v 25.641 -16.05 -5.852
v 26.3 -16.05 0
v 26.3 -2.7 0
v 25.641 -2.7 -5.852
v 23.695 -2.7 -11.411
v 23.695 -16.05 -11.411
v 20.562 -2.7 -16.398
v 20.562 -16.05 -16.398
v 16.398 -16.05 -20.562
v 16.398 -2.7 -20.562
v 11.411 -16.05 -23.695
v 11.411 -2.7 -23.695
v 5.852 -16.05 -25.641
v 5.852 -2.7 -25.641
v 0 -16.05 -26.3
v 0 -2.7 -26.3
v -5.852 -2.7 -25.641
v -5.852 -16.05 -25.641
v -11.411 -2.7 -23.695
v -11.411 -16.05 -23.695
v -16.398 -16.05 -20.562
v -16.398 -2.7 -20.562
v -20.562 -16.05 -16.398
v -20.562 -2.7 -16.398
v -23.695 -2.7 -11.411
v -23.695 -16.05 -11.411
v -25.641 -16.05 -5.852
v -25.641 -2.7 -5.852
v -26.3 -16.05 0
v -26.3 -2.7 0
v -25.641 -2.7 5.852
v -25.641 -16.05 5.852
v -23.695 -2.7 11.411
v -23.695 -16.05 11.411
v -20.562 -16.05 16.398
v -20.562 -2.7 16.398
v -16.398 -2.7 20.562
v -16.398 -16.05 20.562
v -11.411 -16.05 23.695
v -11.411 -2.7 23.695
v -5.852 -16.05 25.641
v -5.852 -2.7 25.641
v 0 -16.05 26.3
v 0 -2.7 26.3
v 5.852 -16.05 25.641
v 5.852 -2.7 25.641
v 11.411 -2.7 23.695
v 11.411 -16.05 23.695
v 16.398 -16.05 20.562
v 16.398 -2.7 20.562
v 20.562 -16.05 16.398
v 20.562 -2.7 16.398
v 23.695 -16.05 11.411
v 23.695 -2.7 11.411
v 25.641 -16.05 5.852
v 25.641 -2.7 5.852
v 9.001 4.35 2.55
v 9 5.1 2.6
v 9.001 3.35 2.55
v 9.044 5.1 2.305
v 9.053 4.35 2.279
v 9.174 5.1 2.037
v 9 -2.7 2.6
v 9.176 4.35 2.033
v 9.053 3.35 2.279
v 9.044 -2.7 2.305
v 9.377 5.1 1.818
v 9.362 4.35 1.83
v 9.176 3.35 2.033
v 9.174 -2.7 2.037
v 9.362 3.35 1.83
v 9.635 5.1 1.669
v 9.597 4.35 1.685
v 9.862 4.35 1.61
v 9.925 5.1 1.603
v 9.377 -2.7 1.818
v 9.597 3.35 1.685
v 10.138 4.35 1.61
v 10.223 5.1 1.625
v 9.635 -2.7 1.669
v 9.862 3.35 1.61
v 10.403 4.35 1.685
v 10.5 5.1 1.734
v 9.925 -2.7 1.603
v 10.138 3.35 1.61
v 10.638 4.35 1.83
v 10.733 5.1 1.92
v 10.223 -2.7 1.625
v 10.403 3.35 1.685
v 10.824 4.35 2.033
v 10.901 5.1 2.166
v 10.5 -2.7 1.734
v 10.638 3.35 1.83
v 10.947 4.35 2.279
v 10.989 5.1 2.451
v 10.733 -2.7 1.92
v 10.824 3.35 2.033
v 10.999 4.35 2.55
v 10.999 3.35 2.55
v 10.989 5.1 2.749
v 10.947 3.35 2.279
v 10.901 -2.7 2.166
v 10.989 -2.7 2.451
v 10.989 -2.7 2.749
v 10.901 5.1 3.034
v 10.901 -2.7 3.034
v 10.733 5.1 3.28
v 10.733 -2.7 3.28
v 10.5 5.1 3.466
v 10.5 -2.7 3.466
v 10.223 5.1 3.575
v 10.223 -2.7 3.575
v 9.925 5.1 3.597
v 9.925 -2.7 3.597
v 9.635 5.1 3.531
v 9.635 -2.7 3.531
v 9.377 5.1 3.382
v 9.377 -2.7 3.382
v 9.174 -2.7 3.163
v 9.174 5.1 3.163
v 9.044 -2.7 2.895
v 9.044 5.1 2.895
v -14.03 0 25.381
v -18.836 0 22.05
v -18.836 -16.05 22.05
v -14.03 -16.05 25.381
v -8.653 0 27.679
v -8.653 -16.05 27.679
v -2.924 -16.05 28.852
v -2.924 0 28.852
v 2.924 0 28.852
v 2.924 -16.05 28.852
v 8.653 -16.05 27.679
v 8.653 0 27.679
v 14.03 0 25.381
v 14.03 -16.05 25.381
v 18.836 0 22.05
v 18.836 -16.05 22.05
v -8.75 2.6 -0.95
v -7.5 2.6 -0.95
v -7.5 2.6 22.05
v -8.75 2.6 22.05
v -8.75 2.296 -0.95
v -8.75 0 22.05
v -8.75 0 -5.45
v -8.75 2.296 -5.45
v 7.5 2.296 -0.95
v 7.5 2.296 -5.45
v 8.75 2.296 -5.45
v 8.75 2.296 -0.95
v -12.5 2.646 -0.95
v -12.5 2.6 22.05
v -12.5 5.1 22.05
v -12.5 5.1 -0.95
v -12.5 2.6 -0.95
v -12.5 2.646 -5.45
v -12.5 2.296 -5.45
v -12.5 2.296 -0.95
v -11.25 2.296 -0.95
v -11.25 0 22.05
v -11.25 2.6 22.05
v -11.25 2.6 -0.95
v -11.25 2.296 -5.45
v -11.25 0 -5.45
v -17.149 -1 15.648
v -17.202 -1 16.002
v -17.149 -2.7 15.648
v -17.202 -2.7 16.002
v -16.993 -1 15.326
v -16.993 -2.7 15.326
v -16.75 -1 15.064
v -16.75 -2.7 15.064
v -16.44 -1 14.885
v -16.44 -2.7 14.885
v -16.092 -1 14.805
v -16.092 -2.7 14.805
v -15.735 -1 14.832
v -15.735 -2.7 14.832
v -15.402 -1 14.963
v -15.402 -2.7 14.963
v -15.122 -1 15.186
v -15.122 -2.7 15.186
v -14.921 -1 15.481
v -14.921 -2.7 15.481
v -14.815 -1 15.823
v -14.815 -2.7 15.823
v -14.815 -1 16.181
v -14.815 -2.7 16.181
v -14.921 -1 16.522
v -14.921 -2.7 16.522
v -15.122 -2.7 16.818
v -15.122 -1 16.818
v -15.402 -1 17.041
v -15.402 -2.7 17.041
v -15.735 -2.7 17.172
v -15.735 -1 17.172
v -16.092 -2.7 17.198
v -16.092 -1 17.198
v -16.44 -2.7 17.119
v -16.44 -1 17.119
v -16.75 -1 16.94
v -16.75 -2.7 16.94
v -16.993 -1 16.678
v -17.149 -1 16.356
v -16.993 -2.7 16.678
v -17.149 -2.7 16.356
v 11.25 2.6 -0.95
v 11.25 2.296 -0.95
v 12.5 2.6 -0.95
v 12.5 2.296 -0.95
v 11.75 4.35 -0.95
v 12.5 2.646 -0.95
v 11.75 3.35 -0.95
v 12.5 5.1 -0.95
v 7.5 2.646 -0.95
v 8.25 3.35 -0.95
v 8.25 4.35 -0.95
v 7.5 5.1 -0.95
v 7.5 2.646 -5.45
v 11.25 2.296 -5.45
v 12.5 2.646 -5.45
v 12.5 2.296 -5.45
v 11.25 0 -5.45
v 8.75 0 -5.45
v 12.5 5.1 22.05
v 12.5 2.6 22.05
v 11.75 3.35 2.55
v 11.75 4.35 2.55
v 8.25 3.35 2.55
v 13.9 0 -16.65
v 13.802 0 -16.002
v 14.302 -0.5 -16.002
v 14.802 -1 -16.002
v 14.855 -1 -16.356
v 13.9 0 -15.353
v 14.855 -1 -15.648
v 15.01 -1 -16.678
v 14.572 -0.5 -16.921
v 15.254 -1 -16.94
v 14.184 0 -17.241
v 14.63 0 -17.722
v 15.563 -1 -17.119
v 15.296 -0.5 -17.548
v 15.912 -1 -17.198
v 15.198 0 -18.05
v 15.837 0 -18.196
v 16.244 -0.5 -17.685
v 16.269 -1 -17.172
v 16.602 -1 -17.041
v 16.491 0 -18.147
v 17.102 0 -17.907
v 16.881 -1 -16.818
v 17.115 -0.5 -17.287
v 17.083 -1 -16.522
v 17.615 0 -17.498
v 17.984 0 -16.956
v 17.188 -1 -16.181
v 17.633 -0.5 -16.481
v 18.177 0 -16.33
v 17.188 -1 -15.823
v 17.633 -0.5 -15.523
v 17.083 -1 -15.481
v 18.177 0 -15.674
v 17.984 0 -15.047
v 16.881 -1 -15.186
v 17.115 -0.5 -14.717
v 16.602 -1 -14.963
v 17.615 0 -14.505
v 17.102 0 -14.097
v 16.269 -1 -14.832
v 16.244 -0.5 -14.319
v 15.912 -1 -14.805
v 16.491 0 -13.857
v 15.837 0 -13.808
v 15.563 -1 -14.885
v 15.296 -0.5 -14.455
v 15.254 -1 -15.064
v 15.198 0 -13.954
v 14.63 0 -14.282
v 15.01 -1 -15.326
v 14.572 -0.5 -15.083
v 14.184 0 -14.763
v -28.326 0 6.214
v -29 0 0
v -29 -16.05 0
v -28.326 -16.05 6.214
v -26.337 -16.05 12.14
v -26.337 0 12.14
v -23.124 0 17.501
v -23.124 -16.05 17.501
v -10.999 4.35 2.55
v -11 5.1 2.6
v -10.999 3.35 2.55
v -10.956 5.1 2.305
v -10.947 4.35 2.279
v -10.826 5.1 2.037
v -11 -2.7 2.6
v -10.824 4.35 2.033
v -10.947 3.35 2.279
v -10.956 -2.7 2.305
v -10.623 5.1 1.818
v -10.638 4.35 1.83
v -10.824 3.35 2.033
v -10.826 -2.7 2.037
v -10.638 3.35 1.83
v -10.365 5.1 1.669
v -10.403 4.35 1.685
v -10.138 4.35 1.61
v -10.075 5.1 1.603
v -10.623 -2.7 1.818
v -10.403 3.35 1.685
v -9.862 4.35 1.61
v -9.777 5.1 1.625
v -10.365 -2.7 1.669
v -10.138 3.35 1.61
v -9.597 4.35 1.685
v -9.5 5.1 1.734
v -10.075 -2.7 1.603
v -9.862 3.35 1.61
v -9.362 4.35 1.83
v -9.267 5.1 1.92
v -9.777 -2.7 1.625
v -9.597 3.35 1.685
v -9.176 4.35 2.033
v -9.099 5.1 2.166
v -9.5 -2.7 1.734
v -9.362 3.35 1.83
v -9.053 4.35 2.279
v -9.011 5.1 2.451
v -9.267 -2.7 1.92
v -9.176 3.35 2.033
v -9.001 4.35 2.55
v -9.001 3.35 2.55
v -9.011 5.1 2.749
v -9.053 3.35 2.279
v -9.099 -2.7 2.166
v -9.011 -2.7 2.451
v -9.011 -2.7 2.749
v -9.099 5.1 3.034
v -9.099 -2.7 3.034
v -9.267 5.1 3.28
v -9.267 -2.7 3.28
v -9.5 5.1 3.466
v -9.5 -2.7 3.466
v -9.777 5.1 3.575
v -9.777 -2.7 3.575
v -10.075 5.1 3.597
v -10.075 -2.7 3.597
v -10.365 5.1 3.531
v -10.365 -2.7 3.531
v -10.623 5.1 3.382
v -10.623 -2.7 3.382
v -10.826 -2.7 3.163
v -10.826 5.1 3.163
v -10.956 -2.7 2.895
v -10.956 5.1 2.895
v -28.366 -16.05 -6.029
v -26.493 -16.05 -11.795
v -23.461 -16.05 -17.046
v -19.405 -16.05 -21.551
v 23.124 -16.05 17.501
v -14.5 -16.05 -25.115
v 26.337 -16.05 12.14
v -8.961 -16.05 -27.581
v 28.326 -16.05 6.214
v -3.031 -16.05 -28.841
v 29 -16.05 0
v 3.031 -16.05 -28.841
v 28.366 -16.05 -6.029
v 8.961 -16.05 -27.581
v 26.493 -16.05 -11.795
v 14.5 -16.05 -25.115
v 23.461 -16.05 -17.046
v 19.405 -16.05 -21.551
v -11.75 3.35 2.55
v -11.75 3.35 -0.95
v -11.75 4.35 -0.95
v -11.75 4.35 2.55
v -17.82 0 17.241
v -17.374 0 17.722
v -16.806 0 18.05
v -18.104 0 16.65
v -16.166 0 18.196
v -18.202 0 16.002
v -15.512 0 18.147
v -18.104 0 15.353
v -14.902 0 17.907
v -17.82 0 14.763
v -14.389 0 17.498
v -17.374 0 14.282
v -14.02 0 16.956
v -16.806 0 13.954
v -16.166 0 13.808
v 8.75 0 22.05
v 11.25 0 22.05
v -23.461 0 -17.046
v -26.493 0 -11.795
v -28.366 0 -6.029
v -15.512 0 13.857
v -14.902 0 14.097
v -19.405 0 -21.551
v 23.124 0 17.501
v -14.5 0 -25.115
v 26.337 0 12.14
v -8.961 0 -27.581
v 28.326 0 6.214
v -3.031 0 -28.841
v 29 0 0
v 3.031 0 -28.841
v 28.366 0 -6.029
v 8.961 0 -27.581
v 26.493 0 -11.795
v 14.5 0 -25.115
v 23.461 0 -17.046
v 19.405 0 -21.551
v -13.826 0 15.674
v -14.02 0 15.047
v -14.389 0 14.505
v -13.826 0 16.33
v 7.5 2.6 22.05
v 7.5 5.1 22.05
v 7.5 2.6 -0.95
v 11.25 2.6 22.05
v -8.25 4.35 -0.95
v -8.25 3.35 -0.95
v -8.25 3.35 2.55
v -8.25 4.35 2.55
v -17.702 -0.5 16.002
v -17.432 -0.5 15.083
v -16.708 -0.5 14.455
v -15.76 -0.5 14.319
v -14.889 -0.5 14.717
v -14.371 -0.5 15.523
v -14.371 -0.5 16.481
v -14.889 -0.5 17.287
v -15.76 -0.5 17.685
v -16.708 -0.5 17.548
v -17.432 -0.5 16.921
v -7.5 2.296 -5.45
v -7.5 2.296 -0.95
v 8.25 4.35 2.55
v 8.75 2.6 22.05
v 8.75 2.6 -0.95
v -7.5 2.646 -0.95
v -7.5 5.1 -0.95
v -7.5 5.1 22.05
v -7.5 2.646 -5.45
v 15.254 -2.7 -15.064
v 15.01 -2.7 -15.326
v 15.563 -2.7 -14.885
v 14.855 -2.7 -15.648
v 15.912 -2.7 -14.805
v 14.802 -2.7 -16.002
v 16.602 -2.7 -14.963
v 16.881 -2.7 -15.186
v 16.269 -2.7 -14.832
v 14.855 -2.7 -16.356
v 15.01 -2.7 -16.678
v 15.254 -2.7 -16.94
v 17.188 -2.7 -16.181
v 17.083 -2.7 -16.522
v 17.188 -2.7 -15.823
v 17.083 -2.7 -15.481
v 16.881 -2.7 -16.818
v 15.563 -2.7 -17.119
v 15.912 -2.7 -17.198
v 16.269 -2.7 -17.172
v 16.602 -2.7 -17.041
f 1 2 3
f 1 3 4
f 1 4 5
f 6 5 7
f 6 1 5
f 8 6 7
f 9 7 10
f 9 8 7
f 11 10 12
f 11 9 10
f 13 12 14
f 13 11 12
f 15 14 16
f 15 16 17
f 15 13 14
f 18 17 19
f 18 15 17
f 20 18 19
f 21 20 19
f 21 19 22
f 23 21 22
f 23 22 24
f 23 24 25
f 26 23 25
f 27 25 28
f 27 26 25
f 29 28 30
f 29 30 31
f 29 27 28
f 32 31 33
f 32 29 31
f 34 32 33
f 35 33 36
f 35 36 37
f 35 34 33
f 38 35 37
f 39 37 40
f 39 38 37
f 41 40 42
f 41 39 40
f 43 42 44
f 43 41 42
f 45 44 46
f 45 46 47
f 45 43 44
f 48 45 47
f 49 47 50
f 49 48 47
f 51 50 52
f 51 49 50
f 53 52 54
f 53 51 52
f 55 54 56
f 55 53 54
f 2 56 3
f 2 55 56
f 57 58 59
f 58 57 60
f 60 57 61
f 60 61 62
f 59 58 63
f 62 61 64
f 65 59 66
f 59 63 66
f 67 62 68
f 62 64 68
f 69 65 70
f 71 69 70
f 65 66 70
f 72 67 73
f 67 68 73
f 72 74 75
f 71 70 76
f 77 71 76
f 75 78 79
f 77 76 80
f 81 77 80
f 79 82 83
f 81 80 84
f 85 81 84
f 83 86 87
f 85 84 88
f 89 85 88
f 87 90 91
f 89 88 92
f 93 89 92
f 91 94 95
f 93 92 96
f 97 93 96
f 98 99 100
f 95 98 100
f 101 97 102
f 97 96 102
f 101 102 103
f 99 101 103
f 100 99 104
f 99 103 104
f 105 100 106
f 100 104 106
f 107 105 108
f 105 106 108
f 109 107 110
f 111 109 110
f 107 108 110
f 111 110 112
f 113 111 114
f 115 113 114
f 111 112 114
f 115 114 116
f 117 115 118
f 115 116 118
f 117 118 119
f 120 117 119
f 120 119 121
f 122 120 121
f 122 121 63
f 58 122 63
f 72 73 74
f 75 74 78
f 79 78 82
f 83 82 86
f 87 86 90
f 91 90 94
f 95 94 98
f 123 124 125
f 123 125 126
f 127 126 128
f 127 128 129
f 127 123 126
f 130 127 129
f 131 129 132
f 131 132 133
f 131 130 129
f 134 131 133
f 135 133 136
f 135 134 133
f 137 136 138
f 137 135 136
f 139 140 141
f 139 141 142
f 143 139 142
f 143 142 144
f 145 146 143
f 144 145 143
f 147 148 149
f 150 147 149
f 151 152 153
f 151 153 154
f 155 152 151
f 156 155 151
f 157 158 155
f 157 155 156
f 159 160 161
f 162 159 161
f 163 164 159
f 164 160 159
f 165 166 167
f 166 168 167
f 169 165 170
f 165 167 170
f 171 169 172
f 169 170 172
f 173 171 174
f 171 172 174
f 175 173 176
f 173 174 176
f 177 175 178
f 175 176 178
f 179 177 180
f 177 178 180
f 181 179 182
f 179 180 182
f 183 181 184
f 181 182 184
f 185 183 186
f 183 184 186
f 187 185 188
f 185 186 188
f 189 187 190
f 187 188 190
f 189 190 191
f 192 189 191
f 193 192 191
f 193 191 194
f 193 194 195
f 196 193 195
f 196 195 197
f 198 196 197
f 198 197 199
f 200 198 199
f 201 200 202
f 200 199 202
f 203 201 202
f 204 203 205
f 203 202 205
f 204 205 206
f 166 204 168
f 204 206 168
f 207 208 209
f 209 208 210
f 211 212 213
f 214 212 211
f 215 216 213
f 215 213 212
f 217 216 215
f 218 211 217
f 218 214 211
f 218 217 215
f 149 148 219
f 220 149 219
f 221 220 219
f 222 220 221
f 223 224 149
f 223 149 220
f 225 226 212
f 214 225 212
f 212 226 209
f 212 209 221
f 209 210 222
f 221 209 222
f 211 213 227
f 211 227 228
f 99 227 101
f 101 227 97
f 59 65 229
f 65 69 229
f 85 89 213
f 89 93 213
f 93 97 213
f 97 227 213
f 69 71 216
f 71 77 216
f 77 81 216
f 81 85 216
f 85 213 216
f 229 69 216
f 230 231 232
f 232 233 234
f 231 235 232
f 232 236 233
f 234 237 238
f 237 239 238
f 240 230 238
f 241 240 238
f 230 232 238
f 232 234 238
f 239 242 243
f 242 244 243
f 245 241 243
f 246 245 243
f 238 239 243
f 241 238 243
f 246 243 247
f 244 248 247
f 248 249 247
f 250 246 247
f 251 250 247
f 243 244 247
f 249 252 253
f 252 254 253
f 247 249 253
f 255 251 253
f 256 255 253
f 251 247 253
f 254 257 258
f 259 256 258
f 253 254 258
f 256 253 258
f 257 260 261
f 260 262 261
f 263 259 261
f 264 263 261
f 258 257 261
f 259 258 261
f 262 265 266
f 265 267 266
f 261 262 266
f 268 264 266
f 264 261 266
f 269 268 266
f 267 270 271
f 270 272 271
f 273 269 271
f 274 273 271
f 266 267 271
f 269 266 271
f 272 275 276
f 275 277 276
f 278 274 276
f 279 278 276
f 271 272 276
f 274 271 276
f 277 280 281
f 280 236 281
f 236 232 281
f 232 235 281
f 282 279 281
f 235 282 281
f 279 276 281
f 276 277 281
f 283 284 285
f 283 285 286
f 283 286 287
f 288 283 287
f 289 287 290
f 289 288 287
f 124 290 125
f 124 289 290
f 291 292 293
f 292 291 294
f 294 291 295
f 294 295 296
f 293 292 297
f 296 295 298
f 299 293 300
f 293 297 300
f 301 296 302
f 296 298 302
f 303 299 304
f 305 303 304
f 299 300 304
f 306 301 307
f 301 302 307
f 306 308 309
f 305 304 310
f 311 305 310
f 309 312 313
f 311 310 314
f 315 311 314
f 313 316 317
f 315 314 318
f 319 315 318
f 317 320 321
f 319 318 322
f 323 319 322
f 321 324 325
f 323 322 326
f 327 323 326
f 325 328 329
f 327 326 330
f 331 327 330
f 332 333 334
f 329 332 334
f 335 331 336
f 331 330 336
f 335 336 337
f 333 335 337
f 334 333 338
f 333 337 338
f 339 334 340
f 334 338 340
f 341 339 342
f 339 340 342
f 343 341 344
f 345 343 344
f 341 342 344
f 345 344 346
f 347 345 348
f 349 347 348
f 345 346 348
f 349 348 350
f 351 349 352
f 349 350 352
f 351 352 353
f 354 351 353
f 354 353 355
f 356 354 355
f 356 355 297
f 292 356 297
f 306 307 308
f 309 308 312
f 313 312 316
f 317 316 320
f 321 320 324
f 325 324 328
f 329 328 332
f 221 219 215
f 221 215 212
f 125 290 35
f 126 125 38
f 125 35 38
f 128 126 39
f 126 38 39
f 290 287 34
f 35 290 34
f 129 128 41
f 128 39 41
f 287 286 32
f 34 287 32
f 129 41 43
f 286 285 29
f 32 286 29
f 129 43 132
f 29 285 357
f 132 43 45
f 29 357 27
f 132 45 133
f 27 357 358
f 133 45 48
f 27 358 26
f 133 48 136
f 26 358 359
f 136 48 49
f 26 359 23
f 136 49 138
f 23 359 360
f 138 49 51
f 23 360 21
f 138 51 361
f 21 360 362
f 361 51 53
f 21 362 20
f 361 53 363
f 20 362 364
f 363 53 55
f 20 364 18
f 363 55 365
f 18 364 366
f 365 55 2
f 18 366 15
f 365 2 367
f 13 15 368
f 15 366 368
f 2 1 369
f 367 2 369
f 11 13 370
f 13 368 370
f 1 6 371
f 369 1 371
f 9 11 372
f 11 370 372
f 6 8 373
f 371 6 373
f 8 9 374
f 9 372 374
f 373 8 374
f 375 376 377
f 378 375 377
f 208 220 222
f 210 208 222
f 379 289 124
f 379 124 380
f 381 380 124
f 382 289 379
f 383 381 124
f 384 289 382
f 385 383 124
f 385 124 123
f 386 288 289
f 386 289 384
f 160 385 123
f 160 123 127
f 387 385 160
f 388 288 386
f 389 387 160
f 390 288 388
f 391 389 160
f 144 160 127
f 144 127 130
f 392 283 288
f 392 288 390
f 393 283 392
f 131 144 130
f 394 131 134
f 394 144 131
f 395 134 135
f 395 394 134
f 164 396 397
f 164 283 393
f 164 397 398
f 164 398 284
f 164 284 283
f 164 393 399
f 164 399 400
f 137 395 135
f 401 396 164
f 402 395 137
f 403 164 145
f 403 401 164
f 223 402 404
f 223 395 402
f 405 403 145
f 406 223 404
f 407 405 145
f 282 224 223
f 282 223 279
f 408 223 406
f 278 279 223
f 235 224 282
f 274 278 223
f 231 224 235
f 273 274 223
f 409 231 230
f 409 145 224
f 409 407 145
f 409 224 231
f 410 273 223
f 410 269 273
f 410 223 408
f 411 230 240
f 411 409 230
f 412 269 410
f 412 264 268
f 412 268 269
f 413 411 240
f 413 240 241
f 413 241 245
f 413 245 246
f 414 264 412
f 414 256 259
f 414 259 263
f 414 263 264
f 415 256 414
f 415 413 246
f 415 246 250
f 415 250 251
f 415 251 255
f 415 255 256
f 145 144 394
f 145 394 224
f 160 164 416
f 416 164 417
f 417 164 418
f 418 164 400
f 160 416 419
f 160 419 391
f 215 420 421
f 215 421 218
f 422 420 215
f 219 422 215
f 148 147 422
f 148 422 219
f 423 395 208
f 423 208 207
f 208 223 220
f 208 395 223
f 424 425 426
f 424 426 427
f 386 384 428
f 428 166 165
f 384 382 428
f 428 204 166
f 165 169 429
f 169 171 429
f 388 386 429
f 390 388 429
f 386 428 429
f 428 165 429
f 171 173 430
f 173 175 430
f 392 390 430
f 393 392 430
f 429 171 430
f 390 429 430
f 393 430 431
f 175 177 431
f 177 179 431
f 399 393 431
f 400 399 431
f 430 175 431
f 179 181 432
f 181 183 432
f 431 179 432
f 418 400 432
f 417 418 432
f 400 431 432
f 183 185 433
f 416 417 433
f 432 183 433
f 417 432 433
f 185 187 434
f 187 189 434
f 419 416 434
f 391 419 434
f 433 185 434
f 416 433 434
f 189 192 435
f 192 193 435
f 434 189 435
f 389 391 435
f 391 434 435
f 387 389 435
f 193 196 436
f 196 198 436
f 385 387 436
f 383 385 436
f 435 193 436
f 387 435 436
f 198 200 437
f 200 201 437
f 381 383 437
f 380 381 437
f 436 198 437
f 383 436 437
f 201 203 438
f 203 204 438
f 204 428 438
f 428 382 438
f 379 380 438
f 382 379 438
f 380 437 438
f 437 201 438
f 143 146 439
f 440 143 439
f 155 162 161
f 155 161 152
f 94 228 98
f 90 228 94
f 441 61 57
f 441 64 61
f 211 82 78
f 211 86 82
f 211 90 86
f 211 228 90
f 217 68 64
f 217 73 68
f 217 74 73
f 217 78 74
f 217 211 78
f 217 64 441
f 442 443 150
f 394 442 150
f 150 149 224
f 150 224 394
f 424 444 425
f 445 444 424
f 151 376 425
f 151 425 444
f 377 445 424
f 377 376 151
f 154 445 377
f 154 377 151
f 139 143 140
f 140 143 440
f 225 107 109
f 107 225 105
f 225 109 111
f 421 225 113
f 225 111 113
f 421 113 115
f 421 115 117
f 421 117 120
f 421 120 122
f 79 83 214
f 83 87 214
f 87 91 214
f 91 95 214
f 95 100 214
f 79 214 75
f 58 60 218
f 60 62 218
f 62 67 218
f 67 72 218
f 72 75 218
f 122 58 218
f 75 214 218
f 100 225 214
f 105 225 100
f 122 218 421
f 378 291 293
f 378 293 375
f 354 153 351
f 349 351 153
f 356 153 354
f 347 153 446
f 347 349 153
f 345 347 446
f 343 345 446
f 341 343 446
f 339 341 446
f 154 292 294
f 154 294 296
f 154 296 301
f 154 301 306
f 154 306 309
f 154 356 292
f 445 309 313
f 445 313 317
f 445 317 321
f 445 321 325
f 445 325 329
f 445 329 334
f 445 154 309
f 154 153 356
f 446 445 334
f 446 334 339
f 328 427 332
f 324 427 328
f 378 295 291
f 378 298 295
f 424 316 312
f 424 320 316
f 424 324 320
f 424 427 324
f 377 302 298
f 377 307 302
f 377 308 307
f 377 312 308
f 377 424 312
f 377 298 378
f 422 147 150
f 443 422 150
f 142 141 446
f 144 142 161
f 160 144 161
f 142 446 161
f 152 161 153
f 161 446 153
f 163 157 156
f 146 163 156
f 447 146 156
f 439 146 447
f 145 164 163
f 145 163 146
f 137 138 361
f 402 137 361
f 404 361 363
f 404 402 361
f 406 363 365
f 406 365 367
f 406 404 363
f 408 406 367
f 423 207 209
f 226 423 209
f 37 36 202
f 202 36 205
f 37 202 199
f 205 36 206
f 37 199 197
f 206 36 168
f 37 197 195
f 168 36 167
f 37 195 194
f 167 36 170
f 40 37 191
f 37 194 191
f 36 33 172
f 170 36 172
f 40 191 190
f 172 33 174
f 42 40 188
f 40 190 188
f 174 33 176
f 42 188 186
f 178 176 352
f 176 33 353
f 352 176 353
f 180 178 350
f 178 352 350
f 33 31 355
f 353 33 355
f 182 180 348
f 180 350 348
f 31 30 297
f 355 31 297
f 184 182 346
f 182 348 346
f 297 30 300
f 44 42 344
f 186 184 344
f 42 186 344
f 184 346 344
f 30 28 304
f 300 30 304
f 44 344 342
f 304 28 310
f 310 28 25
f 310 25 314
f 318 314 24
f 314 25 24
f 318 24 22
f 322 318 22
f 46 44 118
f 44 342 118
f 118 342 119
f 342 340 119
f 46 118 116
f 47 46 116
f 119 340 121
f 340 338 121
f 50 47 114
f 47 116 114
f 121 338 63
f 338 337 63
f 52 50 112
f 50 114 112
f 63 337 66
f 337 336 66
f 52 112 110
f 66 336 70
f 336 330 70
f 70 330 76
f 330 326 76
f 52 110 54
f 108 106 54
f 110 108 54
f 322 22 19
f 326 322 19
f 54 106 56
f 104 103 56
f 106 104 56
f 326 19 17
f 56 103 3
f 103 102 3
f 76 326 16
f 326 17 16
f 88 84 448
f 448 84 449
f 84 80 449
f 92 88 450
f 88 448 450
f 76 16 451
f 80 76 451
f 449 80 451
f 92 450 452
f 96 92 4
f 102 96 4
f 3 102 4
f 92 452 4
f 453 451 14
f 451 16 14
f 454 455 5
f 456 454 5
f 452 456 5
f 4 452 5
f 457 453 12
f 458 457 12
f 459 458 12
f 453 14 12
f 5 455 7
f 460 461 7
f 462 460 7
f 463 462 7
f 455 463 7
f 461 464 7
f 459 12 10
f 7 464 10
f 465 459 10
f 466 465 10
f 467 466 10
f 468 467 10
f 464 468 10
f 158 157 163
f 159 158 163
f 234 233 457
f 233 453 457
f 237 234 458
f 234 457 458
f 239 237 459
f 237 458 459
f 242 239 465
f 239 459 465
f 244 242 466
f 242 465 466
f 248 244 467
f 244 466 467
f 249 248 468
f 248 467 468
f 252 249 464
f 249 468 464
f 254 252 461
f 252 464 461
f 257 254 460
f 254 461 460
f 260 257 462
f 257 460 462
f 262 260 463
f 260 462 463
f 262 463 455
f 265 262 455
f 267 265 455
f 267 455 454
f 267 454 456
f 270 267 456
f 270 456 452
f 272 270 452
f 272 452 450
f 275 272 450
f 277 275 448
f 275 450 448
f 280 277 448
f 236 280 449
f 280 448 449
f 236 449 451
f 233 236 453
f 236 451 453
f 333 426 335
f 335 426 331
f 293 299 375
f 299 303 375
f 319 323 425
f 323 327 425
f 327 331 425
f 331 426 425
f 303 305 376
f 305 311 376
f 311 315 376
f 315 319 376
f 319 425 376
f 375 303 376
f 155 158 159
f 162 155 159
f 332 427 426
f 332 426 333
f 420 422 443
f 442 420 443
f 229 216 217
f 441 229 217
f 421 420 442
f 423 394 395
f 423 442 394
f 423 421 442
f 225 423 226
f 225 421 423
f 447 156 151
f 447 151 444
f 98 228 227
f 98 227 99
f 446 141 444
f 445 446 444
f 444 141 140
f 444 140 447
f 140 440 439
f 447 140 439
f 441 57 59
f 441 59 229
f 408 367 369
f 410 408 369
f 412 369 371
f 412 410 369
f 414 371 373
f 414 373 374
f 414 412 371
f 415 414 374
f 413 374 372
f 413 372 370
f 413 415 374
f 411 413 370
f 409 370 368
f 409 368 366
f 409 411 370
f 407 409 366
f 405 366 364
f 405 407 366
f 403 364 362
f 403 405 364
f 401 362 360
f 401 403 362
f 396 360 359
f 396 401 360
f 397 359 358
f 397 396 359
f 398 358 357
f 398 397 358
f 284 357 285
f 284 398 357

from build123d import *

# Parameters (mm, degrees)
BOSS_EXTRUDE1_DEPTH                                  = 22.05
BOSS_EXTRUDE1_DEPTH_BACK                             = 5.45
BOSS_EXTRUDE1_2_DEPTH                                = 22.05
BOSS_EXTRUDE1_2_DEPTH_BACK                           = 5.45
SKETCH3_W                                            = 51.63175717
SKETCH3_H                                            = 2.803707317
CUT_EXTRUDE1_DEPTH                                   = 4.5
SKETCH5_W                                            = 5
SKETCH5_H                                            = 4.5
BOSS_EXTRUDE2_DEPTH                                  = 0.35
SKETCH4_W                                            = 3.5
SKETCH4_H                                            = 1
CUT_EXTRUDE2_DEPTH                                   = 3.5
BOSS_EXTRUDE3_DEPTH                                  = 16.05
SHELL3_START                                         = -16.05
SHELL3_OUTLINE_R                                     = 26.3
SHELL3_DEPTH                                         = 13.35
F_2_0_2_DIAMETER_HOLE1_D                             = 2
CSK_SLOT_FOR_M2_COUNTERSUNK_FLAT_HEAD_SC_D           = 2.4
CSK_SLOT_FOR_M2_COUNTERSUNK_FLAT_HEAD_SC_CSINK_D     = 4.4
CSK_SLOT_FOR_M2_COUNTERSUNK_FLAT_HEAD_SC_CSINK_ANGLE = 90


# Read off the part's stored shape, not the designer's step: Shell3
with BuildPart() as part:
    # Sketch2 → Boss-Extrude1 (new, two sides: drawn at the far end of the back side and taken through both)
    with BuildSketch(Plane.XY.offset(-BOSS_EXTRUDE1_DEPTH_BACK)):
        Polygon((-11.25, 0), (-11.25, 2.6), (-12.5, 2.6), (-12.5, 5.1), (-7.5, 5.1), (-7.5, 2.6), (-8.75, 2.6), (-8.75, 0), align=None)
    extrude(amount=BOSS_EXTRUDE1_DEPTH + BOSS_EXTRUDE1_DEPTH_BACK)


with BuildPart() as body_2:
    # Sketch2 → Boss-Extrude1 2 (new, two sides: drawn at the far end of the back side and taken through both)
    with BuildSketch(Plane.XY.offset(-BOSS_EXTRUDE1_2_DEPTH_BACK)):
        Polygon((8.75, 0), (11.25, 0), (11.25, 2.6), (12.5, 2.6), (12.5, 5.1), (7.5, 5.1), (7.5, 2.6), (8.75, 2.6), align=None)
    extrude(amount=BOSS_EXTRUDE1_2_DEPTH + BOSS_EXTRUDE1_2_DEPTH_BACK)


with BuildPart() as cut_extrude1_tool:
    # Sketch3 → Cut-Extrude1 (new body)
    with BuildSketch(Plane(origin=(0, 0, -5.45), x_dir=(-1, 0, 0), z_dir=(0, 0, -1))):
        with Locations((1.197864232, 3.698146342)):
            Rectangle(SKETCH3_W, SKETCH3_H)
    extrude(amount=-CUT_EXTRUDE1_DEPTH)


with BuildPart() as part_1:
    add(part.part)

    # Cut-Extrude1: cut by cut_extrude1_tool
    add(cut_extrude1_tool.part, mode=Mode.SUBTRACT)



with BuildPart() as body_2_1:
    add(body_2.part)

    # Cut-Extrude1: cut by cut_extrude1_tool
    add(cut_extrude1_tool.part, mode=Mode.SUBTRACT)


with BuildPart() as part_2:
    add(part_1.part)

    add(body_2_1.part)  # Boss-Extrude2 merges body 2
    # Sketch5 → Boss-Extrude2 (add)
    with BuildSketch(Plane(origin=(0, 2.296292683, 0), x_dir=(1, 0, 0), z_dir=(0, 1, 0))):
        with Locations((10, 3.2)):
            Rectangle(SKETCH5_W, SKETCH5_H)
        with Locations((-10, 3.2)):
            Rectangle(SKETCH5_W, SKETCH5_H)
    extrude(amount=BOSS_EXTRUDE2_DEPTH)

    # Sketch4 → Cut-Extrude2 (cut)
    with BuildSketch(Plane(origin=(0, 0, -0.95), x_dir=(-1, 0, 0), z_dir=(0, 0, -1))):
        with Locations((10, 3.85)):
            Rectangle(SKETCH4_W, SKETCH4_H)
        with Locations((-10, 3.85)):
            Rectangle(SKETCH4_W, SKETCH4_H)
    extrude(amount=-CUT_EXTRUDE2_DEPTH, mode=Mode.SUBTRACT)

    # Sketch1 → Boss-Extrude3 (add)
    with BuildSketch(Plane(origin=(0, 0, 0), x_dir=(1, 0, 0), z_dir=(0, 1, 0))):
        with BuildLine():
            ThreePointArc((-29, -7.4e-08), (-26.336723438, -12.139892855), (-18.836069123, -22.05))
            Line((-18.836069123, -22.05), (18.836069123, -22.05))
            ThreePointArc((18.836069123, -22.05), (26.336723454, -12.139892822), (29, 0))
            ThreePointArc((29, 0), (-3.7e-08, 29), (-29, -7.4e-08))
        make_face()
        with BuildLine():
            Line((18.836069123, -22.05), (-18.836069123, -22.05))
            ThreePointArc((-18.836069123, -22.05), (0, -29), (18.836069123, -22.05))
        make_face()
    extrude(amount=-BOSS_EXTRUDE3_DEPTH)

    # Shell3 outline → Shell3 (cut)
    with BuildSketch(Plane(origin=(0, 0, 0), x_dir=(1, 0, 0), z_dir=(0, 1, 0)).offset(SHELL3_START)):
        Circle(SHELL3_OUTLINE_R)
    extrude(amount=SHELL3_DEPTH, mode=Mode.SUBTRACT)

    # Ø2.0 (2) Diameter Hole1 (through all)
    with Locations(Plane(origin=(0, 5.1, 0), x_dir=(1, 0, 0), z_dir=(0, 1, 0))):
        with Locations((10, -2.6), (-10, -2.6)):
            Hole(F_2_0_2_DIAMETER_HOLE1_D / 2)

    # CSK SLOT for M2 Countersunk Flat Head Screw3 (through all)
    with Locations(Plane(origin=(0, 0, 0), x_dir=(1, 0, 0), z_dir=(0, 1, 0))):
        with Locations((-16.001826458, -16.001826458), (16.001826458, 16.001826458)):
            CounterSinkHole(CSK_SLOT_FOR_M2_COUNTERSUNK_FLAT_HEAD_SC_D / 2, CSK_SLOT_FOR_M2_COUNTERSUNK_FLAT_HEAD_SC_CSINK_D / 2, counter_sink_angle=CSK_SLOT_FOR_M2_COUNTERSUNK_FLAT_HEAD_SC_CSINK_ANGLE)


solid = part_2.part
